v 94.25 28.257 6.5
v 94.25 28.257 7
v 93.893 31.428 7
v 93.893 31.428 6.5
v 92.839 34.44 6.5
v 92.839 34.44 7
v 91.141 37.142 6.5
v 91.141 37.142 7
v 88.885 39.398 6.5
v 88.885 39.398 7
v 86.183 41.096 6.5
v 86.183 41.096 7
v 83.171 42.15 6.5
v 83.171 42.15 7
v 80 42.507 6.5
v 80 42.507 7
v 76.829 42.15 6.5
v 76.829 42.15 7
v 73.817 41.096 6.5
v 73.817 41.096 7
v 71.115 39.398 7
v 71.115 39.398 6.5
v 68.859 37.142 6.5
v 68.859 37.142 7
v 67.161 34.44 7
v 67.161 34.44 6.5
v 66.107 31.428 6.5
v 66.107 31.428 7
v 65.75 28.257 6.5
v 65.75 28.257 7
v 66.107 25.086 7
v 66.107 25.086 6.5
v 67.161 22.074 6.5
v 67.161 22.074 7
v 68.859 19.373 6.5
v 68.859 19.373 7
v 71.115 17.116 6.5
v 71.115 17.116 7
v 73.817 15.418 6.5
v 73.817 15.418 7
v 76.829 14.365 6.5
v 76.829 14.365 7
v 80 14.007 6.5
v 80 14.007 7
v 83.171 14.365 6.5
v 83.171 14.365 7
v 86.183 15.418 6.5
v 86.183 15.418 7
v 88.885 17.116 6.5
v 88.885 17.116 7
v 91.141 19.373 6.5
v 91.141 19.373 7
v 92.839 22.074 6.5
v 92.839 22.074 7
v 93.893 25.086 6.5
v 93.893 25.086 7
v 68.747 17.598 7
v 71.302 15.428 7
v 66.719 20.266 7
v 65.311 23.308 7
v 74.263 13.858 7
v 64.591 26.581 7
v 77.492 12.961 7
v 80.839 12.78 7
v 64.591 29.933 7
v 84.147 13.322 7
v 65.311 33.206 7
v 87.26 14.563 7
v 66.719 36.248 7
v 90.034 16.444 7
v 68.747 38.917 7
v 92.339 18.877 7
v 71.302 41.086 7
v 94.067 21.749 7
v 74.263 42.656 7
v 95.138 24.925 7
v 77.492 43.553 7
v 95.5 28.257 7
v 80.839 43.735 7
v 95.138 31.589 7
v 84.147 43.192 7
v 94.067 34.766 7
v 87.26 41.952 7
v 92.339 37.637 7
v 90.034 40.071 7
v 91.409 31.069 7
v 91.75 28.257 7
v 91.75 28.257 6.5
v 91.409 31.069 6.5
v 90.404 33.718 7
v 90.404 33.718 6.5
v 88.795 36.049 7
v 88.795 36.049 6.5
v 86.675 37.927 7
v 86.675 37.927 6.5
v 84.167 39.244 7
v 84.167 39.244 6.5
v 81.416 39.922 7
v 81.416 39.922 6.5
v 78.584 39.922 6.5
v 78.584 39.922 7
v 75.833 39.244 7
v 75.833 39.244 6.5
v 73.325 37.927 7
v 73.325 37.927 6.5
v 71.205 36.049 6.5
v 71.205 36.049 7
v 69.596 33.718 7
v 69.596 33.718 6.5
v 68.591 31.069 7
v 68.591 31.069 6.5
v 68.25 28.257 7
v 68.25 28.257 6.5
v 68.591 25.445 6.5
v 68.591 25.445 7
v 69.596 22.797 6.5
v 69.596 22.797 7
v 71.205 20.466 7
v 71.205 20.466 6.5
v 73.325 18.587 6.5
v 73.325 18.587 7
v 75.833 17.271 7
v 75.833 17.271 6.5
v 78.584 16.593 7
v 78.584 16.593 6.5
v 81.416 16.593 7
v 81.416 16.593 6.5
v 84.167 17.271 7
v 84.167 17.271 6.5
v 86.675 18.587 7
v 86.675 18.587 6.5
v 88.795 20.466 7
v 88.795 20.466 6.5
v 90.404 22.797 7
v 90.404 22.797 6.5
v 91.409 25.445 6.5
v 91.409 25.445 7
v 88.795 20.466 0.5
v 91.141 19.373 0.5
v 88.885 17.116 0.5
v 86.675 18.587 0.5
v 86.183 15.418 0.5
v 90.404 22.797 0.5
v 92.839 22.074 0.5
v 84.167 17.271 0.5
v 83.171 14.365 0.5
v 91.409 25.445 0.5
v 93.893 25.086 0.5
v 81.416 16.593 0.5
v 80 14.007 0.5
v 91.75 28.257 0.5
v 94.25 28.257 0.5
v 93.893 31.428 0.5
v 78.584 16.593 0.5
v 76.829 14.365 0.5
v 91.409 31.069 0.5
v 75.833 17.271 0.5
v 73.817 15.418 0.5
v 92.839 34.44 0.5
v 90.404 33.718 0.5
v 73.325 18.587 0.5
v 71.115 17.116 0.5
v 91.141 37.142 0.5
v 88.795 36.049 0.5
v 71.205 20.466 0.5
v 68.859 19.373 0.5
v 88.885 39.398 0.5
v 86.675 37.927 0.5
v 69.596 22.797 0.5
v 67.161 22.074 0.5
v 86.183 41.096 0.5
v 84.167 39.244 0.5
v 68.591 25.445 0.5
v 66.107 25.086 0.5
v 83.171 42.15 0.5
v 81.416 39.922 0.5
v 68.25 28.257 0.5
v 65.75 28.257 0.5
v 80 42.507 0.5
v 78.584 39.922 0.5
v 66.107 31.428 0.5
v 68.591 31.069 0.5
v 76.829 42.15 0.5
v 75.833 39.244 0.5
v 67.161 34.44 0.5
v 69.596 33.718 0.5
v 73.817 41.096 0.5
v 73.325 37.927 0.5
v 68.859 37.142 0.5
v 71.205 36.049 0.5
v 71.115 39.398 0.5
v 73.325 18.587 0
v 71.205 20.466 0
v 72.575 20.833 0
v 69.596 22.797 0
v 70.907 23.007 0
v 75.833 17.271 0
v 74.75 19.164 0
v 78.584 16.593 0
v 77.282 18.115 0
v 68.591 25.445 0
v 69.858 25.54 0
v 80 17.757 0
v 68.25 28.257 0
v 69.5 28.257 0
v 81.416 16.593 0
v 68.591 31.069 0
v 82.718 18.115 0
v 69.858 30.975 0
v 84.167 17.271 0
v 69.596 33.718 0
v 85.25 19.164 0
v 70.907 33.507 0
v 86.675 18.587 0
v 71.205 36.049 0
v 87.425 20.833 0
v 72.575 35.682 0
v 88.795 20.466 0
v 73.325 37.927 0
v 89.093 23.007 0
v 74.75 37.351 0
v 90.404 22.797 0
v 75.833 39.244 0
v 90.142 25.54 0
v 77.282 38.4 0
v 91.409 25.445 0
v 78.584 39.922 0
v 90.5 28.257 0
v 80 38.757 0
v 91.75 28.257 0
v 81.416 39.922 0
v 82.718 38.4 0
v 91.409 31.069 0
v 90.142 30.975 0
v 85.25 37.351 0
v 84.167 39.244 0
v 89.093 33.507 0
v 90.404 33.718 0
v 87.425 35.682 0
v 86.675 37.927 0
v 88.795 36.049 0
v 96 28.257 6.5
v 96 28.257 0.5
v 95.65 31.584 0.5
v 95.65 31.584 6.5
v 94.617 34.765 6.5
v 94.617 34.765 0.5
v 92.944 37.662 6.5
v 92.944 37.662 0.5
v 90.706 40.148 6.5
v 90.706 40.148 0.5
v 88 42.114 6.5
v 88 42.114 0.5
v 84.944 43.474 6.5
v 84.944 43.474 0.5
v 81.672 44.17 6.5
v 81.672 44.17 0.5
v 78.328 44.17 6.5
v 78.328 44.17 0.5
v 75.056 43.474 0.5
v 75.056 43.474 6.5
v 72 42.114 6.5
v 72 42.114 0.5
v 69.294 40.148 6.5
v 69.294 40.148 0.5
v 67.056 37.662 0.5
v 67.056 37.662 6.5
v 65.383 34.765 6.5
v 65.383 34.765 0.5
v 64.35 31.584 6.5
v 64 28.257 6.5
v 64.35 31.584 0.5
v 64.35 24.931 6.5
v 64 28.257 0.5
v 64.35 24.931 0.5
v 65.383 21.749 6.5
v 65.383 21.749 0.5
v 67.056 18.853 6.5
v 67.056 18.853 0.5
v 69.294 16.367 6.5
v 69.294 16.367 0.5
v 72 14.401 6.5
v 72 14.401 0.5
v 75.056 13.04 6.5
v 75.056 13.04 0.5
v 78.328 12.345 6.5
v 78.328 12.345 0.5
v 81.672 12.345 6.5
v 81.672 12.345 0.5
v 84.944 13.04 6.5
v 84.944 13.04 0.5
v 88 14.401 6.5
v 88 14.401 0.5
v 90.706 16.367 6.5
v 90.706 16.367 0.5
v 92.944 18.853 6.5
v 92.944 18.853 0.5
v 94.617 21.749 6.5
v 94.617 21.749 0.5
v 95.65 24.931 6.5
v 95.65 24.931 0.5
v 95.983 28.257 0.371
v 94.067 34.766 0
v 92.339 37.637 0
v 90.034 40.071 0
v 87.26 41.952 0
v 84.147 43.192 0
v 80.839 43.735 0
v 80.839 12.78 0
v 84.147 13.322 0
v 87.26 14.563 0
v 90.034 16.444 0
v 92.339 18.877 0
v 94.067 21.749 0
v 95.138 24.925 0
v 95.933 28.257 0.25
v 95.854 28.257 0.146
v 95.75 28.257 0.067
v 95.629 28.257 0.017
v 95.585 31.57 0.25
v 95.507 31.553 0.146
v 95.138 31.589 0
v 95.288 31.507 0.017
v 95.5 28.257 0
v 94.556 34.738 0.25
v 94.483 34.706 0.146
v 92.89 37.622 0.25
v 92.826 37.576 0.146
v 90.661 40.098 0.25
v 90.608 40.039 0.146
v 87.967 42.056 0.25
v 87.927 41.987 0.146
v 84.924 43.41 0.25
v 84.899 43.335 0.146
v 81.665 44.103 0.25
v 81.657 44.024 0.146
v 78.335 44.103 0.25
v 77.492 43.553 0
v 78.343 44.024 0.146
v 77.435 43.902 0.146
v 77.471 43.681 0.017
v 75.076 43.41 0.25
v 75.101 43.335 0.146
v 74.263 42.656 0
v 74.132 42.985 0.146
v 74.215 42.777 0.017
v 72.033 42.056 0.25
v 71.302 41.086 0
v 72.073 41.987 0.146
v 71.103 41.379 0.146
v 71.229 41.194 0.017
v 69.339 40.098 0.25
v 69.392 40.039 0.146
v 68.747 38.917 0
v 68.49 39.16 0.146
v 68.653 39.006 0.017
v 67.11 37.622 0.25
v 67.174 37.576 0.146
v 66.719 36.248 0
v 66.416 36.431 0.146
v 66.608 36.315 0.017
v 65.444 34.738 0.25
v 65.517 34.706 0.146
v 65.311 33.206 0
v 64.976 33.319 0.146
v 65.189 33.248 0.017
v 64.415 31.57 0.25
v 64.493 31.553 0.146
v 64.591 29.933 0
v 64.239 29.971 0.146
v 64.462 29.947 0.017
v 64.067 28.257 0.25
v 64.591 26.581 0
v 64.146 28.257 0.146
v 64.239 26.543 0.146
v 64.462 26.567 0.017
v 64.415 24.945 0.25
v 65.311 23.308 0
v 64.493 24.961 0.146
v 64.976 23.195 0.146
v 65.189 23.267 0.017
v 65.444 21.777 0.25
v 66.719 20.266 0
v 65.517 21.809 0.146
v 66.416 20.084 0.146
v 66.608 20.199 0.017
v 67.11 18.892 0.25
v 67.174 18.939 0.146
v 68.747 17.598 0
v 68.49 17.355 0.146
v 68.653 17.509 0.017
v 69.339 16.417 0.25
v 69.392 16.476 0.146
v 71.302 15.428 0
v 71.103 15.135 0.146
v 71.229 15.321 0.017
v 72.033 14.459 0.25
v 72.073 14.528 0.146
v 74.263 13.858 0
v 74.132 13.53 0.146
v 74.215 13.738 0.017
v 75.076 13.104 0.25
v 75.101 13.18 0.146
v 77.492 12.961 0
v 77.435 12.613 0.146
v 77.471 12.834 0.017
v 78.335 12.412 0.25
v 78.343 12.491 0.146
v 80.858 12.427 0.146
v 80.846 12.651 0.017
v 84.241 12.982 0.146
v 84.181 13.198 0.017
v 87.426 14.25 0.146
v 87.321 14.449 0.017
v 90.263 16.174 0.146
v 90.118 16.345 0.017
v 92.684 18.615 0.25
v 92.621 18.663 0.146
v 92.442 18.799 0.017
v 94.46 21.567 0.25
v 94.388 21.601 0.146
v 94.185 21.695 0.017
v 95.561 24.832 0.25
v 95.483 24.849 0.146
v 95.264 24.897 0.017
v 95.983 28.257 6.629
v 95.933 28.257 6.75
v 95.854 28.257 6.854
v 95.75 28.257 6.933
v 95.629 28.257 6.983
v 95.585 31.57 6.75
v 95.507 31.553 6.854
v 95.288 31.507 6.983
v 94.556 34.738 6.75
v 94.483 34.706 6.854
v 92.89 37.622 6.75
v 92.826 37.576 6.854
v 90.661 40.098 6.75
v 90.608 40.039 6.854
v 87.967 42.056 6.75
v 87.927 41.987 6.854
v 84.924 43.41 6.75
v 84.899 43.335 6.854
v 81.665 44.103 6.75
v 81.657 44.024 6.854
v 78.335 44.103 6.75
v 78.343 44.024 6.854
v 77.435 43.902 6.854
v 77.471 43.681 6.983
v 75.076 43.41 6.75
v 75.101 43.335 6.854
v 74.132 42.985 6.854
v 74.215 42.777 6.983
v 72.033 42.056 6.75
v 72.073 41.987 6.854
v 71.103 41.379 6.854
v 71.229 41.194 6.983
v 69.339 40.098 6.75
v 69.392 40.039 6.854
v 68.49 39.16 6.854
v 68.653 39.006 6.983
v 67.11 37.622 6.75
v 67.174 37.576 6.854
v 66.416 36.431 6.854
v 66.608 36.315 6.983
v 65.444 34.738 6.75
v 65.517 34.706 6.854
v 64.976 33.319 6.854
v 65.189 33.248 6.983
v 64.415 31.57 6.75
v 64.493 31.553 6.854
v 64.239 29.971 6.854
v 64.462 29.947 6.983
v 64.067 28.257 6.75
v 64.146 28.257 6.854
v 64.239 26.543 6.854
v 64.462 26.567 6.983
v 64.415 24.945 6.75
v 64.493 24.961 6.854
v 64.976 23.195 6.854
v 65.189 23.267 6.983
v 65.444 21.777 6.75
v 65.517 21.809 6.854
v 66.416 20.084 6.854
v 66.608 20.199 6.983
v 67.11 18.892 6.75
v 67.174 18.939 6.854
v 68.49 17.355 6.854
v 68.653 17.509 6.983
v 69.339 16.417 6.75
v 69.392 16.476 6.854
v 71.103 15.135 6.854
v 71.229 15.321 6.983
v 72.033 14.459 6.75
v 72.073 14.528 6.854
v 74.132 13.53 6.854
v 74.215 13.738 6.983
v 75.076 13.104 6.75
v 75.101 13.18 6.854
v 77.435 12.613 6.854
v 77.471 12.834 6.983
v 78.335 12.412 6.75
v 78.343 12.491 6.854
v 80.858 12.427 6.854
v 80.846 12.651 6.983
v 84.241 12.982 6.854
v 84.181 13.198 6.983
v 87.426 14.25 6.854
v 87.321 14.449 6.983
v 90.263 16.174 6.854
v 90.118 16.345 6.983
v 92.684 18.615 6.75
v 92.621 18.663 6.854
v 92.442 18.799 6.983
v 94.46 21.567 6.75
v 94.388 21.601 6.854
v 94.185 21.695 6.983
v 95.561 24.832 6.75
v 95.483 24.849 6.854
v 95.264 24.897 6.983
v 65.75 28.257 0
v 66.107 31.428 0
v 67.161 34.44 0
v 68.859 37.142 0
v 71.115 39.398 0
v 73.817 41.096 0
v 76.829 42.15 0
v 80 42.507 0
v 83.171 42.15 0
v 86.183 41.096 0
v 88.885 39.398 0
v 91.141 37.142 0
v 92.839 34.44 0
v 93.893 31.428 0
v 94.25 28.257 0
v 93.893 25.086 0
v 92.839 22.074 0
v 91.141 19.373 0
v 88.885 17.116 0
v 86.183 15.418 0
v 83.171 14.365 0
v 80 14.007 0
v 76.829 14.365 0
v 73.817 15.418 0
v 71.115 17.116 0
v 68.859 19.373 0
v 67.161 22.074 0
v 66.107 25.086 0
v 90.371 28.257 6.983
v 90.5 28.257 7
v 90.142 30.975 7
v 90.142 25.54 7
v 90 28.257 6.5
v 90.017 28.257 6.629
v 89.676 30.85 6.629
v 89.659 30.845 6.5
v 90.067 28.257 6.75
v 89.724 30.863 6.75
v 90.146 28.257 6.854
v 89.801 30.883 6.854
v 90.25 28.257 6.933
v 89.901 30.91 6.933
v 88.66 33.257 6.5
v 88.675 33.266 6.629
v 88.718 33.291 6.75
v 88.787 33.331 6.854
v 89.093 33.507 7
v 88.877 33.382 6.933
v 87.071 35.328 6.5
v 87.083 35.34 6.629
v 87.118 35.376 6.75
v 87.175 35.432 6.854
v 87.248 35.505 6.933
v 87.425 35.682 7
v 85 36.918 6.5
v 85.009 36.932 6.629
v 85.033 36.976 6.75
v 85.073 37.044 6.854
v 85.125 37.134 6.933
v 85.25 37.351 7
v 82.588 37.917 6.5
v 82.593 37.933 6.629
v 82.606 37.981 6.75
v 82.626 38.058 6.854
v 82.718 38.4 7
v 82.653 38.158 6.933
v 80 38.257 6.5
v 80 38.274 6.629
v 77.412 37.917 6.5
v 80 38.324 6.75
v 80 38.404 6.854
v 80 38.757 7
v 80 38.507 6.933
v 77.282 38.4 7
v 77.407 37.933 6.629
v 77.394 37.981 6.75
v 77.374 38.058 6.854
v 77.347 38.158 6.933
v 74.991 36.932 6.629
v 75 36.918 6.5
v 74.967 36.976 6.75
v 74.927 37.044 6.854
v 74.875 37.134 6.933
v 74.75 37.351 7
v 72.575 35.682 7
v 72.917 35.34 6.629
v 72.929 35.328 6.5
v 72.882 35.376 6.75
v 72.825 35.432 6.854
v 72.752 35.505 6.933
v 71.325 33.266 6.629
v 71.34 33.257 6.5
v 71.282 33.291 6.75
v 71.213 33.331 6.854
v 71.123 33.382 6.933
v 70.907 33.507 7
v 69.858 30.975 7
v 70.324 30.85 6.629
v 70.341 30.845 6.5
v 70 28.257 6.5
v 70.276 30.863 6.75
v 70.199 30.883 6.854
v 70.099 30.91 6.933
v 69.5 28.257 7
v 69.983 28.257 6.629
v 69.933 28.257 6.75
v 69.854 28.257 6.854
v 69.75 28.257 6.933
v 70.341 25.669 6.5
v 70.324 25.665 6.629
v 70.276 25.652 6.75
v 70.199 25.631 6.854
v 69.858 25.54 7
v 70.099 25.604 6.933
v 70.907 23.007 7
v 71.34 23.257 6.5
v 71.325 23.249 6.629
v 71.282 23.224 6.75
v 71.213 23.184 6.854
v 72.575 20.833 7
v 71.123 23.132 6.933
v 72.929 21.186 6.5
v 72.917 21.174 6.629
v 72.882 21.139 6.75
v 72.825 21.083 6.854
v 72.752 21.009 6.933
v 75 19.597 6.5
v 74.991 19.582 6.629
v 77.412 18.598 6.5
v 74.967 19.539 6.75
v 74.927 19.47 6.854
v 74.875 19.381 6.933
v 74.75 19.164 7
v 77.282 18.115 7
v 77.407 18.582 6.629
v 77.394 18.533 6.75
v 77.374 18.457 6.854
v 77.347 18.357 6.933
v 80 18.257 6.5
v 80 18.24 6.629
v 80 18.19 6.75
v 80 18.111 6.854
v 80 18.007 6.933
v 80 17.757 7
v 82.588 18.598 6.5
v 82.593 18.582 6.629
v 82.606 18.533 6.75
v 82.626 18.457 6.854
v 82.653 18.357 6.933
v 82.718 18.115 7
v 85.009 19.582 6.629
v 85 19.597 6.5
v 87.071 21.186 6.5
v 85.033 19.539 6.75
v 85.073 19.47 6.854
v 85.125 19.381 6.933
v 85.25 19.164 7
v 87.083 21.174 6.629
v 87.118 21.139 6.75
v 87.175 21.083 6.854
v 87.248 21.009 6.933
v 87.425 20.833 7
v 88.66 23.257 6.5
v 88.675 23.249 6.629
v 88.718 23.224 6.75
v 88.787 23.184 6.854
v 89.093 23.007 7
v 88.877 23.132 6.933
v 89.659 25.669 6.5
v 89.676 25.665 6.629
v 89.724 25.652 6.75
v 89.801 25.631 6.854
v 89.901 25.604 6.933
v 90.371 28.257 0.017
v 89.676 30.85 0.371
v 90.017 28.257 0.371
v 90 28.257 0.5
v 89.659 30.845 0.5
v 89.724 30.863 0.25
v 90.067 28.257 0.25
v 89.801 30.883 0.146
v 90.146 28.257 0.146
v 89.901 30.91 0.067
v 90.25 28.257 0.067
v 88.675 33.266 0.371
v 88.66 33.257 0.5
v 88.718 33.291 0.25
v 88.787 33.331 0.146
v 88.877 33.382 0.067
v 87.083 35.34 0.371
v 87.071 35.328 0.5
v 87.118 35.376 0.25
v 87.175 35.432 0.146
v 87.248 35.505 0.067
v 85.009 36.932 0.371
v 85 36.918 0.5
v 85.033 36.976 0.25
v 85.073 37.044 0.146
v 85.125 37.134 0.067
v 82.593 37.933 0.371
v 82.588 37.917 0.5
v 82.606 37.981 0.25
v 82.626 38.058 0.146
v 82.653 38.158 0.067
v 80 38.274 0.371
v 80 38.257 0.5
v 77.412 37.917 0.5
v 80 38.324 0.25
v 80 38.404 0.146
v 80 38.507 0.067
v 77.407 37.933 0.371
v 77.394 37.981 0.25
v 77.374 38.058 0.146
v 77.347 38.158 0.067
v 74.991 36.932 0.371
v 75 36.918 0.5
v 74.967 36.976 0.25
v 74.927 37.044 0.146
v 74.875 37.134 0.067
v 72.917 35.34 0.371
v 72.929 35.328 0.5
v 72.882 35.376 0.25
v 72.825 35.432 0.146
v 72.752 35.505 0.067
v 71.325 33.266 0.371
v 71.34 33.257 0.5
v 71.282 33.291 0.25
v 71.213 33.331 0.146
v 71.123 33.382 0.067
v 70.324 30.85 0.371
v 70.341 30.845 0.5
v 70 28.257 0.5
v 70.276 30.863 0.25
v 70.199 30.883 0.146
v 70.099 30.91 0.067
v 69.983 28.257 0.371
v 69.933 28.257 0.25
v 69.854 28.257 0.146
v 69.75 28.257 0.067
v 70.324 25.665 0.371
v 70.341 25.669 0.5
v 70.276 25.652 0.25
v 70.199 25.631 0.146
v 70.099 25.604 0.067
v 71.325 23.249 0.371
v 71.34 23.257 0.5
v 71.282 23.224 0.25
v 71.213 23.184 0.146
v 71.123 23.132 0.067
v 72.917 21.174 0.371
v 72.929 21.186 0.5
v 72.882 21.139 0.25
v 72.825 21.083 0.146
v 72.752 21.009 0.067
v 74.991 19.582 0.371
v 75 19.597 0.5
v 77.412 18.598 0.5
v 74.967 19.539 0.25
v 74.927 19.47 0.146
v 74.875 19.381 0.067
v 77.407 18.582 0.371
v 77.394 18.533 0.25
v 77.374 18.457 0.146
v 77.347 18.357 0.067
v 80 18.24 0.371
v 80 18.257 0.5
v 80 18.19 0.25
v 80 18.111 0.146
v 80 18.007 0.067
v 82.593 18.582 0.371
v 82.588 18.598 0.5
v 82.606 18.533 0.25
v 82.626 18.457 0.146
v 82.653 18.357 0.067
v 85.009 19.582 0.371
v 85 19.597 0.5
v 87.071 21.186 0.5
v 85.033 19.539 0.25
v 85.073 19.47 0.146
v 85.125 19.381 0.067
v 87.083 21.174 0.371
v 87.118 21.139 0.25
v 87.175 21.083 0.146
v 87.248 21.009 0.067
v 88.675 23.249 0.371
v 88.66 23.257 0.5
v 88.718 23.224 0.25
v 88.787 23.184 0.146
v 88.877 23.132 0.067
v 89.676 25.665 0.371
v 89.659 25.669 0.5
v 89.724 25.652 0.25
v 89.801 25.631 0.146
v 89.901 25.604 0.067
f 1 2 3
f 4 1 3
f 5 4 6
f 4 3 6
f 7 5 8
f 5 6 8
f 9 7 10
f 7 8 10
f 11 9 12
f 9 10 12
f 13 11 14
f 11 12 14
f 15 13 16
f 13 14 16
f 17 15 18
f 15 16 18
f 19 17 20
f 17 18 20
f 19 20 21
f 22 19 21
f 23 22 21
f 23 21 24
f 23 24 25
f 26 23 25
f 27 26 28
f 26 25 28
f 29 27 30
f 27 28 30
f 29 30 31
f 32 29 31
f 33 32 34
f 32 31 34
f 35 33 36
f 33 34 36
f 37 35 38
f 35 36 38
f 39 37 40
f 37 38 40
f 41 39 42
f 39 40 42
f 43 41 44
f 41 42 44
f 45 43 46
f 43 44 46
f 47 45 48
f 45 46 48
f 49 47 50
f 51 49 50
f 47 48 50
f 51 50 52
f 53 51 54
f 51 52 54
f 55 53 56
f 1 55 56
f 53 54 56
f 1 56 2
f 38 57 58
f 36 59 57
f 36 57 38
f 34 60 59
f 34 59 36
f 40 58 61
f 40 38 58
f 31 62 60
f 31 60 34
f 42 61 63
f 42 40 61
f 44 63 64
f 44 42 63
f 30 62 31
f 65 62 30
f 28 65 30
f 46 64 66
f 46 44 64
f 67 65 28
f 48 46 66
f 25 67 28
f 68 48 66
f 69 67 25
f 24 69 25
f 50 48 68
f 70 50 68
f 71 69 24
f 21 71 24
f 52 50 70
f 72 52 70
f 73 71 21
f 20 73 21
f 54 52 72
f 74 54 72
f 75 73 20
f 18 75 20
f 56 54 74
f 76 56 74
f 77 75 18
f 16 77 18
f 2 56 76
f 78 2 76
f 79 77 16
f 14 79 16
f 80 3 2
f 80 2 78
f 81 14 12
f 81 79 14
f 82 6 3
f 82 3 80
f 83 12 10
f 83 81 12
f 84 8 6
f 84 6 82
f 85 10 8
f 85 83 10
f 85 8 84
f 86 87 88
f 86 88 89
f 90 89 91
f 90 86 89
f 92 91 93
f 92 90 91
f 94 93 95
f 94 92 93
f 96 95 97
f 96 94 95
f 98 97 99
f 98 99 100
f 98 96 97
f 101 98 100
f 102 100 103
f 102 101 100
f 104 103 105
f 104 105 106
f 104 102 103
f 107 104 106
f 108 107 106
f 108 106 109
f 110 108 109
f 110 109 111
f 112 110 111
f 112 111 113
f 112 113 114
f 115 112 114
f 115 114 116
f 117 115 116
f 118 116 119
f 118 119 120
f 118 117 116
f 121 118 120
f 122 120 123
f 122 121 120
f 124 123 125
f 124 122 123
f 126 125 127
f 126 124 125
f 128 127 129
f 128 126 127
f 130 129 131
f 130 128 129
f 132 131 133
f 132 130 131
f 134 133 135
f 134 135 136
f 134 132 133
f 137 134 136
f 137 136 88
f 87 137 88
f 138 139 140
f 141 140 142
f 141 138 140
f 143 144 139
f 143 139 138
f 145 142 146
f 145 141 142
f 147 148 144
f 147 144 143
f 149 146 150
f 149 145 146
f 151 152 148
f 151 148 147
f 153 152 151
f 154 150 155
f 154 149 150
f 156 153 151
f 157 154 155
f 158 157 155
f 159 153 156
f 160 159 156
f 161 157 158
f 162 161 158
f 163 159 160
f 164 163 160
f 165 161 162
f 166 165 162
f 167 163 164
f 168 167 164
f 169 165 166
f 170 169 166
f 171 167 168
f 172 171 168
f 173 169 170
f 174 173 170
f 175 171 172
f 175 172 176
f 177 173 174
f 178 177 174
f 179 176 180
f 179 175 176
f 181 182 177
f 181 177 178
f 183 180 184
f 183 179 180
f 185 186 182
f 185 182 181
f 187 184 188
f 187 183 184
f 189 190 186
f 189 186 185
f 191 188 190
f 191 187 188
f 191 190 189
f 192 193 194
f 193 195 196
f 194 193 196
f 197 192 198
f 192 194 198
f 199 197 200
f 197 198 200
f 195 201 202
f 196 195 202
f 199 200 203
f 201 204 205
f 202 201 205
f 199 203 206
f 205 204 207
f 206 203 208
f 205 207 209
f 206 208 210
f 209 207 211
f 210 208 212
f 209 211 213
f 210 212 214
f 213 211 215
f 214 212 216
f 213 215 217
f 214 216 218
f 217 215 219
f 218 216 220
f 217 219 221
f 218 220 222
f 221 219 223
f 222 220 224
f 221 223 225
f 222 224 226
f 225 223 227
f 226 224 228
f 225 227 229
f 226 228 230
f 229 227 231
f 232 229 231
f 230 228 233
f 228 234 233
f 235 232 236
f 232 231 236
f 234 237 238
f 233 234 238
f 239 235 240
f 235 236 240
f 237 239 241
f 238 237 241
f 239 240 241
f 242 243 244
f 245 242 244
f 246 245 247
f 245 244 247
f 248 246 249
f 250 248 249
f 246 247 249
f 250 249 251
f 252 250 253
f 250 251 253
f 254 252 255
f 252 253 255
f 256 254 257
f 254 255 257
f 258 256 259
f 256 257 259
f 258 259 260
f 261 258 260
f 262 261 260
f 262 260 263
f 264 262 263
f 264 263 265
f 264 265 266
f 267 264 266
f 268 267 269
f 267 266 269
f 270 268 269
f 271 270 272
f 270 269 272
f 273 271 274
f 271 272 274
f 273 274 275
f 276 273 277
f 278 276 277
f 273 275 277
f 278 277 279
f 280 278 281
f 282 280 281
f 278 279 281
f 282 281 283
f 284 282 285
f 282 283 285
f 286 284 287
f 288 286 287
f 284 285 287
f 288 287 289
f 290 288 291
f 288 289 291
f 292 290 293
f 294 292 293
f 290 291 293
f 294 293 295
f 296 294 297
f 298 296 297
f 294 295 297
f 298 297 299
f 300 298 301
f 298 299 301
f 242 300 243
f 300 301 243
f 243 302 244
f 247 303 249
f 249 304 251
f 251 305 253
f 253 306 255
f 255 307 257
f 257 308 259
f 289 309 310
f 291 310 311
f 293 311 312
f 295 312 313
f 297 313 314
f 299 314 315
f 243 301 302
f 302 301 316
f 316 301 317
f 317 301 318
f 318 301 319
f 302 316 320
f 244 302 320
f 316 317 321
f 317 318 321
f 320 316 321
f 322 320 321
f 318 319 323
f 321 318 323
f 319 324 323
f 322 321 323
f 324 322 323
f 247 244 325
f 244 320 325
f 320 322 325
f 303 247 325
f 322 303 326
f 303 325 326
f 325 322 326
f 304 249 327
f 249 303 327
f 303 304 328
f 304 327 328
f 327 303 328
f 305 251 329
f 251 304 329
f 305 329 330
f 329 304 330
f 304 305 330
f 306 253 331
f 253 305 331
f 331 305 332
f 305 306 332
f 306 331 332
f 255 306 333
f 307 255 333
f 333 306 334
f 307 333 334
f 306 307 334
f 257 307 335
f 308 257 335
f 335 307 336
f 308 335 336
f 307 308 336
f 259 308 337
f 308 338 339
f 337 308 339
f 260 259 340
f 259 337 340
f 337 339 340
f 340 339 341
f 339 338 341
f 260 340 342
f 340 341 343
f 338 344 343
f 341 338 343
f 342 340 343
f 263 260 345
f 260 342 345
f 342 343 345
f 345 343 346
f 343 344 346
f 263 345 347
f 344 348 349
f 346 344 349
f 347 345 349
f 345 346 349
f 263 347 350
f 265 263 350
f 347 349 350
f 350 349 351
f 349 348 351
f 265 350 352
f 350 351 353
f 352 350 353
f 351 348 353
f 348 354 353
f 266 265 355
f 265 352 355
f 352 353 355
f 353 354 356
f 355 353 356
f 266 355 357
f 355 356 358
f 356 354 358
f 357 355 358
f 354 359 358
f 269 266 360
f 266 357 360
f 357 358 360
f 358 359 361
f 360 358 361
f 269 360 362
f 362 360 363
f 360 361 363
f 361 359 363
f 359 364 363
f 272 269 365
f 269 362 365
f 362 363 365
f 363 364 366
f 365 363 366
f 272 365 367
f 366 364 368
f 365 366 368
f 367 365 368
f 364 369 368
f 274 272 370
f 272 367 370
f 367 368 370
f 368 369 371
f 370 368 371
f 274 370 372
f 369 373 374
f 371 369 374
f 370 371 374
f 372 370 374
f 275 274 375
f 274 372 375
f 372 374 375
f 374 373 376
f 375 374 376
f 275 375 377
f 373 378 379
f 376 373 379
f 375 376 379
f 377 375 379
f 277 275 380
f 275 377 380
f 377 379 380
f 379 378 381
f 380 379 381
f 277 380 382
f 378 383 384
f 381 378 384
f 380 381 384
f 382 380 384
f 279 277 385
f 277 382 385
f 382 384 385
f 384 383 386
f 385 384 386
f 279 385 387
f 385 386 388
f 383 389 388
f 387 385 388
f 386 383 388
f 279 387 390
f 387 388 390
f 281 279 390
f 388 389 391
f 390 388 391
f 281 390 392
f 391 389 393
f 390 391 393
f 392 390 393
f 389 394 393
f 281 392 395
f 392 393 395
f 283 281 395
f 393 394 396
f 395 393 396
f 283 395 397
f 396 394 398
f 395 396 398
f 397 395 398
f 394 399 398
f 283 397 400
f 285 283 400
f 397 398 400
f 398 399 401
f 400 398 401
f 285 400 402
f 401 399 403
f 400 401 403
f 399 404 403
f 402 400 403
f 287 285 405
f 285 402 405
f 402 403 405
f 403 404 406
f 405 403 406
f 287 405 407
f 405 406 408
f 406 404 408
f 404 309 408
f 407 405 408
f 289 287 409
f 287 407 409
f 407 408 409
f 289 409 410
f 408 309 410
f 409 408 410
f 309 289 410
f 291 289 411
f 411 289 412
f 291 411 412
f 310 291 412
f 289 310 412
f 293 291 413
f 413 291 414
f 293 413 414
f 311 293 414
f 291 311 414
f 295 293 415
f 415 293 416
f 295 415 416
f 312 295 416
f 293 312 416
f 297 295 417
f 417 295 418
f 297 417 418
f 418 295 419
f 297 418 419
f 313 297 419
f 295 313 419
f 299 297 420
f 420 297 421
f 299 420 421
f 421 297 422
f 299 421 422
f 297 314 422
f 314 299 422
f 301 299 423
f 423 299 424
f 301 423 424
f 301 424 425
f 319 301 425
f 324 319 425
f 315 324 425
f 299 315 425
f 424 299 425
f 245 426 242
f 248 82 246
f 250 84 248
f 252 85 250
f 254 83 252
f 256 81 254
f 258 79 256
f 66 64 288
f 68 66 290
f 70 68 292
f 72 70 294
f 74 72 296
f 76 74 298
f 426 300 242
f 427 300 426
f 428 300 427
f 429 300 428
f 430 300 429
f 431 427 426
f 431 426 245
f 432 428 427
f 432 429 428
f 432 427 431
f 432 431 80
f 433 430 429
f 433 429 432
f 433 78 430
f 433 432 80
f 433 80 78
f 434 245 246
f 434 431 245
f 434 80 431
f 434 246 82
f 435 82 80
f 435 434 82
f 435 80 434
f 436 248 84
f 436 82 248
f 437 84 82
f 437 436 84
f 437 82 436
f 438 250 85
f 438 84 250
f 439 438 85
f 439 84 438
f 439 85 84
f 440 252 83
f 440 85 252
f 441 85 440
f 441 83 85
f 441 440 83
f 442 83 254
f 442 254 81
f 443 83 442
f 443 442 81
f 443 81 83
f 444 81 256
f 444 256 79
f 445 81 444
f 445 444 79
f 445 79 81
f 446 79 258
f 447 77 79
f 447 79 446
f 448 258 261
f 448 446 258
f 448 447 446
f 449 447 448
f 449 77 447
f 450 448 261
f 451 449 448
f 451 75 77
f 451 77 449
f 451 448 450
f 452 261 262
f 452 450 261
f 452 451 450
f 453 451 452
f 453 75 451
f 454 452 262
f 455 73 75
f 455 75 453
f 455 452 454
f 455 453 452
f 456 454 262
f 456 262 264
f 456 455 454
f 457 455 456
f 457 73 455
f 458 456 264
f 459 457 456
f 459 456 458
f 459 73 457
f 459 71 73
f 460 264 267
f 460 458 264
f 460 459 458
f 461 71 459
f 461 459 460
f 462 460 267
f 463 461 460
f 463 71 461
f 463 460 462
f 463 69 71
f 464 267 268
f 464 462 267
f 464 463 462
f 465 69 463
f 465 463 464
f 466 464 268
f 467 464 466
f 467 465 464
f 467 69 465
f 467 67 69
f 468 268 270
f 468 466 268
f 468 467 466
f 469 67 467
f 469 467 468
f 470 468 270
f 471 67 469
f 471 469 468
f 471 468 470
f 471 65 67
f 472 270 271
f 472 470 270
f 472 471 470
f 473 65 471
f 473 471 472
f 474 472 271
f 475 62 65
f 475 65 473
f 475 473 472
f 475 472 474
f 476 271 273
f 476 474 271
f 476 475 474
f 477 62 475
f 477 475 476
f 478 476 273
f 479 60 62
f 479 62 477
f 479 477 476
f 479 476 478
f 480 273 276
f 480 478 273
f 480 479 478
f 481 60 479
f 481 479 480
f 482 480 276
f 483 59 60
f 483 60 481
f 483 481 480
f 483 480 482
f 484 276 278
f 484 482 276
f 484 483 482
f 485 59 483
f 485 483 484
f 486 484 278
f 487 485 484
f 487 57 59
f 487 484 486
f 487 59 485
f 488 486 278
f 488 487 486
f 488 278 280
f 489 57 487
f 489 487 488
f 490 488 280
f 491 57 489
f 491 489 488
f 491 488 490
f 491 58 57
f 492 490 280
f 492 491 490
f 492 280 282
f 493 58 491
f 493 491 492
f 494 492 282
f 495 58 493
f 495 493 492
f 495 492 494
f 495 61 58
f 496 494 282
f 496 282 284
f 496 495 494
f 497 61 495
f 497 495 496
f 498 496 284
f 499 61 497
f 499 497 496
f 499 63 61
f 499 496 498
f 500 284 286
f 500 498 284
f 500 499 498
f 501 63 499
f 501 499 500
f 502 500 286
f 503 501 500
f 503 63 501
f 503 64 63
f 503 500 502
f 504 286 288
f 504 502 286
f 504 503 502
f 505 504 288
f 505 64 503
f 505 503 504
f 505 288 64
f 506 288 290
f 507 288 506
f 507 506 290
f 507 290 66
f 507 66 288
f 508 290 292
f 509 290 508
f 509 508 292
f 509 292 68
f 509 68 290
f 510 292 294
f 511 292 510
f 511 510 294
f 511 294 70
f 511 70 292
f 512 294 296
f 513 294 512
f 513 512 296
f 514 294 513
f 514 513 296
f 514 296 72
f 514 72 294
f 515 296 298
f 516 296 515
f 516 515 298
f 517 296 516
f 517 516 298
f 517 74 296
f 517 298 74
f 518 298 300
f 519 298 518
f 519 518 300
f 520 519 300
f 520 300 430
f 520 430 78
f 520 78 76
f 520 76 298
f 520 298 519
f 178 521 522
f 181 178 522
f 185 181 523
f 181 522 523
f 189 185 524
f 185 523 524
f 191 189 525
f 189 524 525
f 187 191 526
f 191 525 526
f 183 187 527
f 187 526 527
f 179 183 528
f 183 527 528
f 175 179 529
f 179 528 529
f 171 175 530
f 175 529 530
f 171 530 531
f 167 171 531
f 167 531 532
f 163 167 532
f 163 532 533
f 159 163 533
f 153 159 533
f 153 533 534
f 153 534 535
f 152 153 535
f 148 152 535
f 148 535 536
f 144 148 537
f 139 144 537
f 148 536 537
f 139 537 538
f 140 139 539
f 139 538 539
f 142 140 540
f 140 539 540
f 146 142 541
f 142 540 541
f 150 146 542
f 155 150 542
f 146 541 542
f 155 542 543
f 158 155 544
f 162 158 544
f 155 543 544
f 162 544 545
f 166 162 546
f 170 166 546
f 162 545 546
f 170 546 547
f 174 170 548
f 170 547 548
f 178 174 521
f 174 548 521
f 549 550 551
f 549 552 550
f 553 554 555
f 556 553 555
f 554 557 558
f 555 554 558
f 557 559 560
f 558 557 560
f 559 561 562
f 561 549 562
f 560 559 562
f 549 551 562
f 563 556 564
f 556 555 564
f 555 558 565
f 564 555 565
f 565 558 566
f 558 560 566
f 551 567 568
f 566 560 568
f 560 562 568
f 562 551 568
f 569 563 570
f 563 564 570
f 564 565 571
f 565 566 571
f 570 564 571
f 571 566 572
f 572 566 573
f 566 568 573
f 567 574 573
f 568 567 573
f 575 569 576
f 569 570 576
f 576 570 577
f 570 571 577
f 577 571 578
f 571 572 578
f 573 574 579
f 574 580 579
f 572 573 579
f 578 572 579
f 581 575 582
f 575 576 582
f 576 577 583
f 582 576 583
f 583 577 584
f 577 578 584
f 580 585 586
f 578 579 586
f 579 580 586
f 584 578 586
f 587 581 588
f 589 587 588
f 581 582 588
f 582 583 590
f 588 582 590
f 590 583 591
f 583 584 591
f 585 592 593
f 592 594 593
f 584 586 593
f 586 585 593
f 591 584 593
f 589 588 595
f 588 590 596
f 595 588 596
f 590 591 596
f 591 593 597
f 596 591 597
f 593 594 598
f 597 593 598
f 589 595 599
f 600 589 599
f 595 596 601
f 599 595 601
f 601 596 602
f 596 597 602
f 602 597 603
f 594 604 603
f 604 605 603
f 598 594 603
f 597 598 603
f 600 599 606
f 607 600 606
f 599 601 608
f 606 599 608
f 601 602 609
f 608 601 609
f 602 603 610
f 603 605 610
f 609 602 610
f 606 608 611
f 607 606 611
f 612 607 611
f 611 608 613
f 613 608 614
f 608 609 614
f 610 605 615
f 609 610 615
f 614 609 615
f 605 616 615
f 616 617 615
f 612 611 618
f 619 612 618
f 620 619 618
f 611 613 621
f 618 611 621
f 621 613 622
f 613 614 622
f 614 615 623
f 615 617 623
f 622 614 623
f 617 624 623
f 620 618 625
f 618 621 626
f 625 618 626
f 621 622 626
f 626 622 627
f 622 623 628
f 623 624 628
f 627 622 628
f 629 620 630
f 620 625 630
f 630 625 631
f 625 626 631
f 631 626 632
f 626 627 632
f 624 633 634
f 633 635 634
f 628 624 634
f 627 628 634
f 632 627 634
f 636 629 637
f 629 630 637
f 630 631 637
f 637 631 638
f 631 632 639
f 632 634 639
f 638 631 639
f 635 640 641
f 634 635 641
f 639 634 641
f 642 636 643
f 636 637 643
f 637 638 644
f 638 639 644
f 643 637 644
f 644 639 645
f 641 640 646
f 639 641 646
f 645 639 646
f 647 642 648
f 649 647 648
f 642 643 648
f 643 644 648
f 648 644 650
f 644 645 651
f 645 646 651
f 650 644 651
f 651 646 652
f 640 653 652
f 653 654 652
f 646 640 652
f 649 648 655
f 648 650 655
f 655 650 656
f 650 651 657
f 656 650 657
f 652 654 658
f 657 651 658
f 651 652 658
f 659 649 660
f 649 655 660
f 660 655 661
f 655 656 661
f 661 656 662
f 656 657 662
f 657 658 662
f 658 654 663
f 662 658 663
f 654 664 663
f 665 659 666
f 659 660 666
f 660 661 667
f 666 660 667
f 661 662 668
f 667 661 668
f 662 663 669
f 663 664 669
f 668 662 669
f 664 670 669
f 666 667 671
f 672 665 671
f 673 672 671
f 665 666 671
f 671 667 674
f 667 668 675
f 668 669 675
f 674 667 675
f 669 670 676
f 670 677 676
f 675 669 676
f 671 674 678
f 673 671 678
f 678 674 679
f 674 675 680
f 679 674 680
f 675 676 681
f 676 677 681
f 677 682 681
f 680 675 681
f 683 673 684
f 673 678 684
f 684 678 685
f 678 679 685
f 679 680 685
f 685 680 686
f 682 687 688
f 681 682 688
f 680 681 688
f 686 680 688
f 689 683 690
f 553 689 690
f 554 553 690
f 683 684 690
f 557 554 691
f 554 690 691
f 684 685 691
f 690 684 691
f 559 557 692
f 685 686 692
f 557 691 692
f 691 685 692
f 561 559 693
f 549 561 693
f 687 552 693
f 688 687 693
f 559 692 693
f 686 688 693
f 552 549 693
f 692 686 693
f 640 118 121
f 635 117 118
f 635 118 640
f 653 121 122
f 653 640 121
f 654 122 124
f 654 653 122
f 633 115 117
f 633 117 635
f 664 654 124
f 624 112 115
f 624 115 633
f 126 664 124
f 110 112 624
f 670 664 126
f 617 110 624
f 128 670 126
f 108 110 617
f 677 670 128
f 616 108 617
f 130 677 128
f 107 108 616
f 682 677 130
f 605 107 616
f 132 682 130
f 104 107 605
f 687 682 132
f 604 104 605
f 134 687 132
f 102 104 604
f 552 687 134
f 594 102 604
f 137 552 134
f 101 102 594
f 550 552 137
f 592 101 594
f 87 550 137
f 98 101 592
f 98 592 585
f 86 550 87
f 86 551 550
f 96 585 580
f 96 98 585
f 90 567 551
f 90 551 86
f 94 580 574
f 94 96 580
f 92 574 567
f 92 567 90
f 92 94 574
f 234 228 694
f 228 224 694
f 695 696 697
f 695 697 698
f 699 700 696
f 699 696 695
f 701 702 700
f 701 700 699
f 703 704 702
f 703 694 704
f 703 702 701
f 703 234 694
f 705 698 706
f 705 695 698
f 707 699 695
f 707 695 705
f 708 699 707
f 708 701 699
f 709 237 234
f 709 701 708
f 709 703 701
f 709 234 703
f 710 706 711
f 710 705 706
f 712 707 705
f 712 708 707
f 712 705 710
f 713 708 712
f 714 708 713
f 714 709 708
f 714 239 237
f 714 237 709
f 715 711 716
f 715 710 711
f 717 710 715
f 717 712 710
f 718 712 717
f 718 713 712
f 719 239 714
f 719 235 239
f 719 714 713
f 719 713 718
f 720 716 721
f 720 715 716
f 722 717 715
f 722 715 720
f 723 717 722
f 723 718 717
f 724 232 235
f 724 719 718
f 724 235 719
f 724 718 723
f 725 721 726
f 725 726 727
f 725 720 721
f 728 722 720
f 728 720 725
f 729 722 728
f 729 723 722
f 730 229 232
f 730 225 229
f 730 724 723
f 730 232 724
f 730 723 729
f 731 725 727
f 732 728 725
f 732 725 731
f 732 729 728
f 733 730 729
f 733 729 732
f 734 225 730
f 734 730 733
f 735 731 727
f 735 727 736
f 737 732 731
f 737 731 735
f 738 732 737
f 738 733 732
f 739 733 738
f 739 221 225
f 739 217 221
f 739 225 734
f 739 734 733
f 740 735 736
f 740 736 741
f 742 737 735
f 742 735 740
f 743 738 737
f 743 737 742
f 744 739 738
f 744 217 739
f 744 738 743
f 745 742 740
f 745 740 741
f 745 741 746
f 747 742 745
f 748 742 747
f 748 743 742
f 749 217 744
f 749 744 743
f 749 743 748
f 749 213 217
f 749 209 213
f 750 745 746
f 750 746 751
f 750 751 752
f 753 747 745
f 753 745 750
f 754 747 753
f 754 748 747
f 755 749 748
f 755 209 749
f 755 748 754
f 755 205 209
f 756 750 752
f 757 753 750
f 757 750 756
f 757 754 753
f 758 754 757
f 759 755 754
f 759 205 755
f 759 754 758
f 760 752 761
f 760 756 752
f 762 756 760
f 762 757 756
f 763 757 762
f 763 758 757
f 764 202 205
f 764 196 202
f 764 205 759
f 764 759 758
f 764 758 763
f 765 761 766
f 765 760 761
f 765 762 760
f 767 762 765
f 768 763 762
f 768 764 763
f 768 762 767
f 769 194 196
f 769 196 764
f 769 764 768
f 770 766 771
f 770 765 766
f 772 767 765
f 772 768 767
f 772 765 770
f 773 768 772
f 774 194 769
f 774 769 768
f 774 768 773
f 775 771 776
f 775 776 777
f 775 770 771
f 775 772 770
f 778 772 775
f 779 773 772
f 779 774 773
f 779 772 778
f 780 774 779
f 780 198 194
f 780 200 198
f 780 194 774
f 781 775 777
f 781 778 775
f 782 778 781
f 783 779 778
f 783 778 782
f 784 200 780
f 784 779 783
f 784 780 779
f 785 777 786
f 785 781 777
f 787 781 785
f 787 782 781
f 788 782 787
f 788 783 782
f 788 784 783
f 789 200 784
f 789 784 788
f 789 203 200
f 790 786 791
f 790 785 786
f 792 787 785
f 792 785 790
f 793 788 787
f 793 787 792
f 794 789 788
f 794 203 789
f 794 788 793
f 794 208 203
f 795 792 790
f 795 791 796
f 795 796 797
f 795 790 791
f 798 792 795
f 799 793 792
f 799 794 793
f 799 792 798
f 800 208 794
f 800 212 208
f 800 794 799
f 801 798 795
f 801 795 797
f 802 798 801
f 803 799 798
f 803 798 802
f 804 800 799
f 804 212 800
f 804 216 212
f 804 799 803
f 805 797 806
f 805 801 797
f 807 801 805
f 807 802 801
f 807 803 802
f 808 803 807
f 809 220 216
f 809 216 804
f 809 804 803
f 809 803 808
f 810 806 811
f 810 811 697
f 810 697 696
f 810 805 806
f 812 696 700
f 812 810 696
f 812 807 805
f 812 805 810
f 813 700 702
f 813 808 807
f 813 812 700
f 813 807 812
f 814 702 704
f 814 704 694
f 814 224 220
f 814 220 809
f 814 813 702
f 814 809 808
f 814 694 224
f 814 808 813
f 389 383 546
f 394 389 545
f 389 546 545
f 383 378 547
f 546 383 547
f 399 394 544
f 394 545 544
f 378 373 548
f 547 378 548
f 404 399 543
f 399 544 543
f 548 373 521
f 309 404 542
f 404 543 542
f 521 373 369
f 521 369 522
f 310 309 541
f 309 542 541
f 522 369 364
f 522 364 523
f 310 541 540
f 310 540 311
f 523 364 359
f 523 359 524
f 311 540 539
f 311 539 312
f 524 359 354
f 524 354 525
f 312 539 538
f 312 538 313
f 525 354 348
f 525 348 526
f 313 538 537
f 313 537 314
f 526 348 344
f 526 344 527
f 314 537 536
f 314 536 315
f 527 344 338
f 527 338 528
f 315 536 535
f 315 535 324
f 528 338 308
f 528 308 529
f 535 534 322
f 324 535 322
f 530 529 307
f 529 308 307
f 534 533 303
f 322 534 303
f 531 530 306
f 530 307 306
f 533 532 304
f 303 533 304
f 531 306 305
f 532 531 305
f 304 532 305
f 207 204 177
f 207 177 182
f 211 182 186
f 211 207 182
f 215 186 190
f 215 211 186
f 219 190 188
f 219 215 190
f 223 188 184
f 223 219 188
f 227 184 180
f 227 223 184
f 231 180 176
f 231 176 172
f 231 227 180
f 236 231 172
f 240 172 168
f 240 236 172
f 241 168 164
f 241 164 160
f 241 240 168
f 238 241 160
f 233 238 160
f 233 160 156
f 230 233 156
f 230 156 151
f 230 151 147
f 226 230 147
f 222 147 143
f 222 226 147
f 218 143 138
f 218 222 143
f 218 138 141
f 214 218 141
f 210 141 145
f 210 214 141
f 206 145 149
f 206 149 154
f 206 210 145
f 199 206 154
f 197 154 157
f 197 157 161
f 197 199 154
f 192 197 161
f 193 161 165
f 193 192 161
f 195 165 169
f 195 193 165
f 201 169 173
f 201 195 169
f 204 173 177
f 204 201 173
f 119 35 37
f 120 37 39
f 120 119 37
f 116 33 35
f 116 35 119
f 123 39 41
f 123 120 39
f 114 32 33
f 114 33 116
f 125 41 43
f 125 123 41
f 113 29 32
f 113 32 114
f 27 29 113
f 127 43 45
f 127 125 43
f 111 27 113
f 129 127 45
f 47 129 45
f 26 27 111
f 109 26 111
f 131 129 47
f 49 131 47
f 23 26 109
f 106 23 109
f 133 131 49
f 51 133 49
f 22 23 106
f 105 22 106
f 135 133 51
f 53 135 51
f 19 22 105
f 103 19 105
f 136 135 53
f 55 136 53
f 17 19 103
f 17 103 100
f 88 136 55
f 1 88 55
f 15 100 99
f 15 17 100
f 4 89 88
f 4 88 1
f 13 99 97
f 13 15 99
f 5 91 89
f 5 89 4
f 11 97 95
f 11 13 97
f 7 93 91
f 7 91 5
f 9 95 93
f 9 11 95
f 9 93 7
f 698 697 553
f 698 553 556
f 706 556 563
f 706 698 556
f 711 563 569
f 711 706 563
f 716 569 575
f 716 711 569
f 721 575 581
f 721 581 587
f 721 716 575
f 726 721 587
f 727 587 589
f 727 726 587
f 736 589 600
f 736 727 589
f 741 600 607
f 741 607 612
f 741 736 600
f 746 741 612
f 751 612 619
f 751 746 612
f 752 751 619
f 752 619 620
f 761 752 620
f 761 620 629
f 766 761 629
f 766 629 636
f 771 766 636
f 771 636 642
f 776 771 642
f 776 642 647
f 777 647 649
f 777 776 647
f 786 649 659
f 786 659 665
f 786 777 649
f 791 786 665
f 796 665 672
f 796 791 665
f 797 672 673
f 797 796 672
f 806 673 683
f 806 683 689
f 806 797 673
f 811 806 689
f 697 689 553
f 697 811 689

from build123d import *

# Parameters (mm, degrees)
SKETCH1_R           = 16
SKETCH1_R_2         = 10
BOSS_EXTRUDE1_DEPTH = 7
FILLET1_R           = 0.5
SKETCH2_R           = 14.25
SKETCH2_R_2         = 11.75
CUT_EXTRUDE1_DEPTH  = 0.5
SKETCH3_R           = 14.25
SKETCH3_R_2         = 11.75
CUT_EXTRUDE2_DEPTH  = 0.5


with BuildPart() as part:
    # Sketch1 → Boss-Extrude1 (new body)
    with BuildSketch(Plane.XY):
        with Locations((80, 28.257283518)):
            Circle(SKETCH1_R)
        with Locations((80, 28.257283518)):
            Circle(SKETCH1_R_2, mode=Mode.SUBTRACT)
    extrude(amount=BOSS_EXTRUDE1_DEPTH)

    # Fillet1
    fillet1_edges = [part.edges().sort_by_distance(p)[0] for p in [
        (64, 28.257283518, 0),
        (64, 28.257283518, 7),
        (70, 28.257283518, 0),
        (70, 28.257283518, 7),
    ]]
    fillet(fillet1_edges, radius=FILLET1_R)

    # Sketch2 → Cut-Extrude1 (cut)
    with BuildSketch(Plane(origin=(0, 0, 0), x_dir=(-1, 0, 0), z_dir=(0, 0, -1))):
        with Locations((-80, 28.257283518)):
            Circle(SKETCH2_R)
        with Locations((-80, 28.257283518)):
            Circle(SKETCH2_R_2, mode=Mode.SUBTRACT)
    extrude(amount=-CUT_EXTRUDE1_DEPTH, mode=Mode.SUBTRACT)

    # Sketch3 → Cut-Extrude2 (cut)
    with BuildSketch(Plane.XY.offset(7)):
        with Locations((80, 28.257283518)):
            Circle(SKETCH3_R)
        with Locations((80, 28.257283518)):
            Circle(SKETCH3_R_2, mode=Mode.SUBTRACT)
    extrude(amount=-CUT_EXTRUDE2_DEPTH, mode=Mode.SUBTRACT)


solid = part.part
